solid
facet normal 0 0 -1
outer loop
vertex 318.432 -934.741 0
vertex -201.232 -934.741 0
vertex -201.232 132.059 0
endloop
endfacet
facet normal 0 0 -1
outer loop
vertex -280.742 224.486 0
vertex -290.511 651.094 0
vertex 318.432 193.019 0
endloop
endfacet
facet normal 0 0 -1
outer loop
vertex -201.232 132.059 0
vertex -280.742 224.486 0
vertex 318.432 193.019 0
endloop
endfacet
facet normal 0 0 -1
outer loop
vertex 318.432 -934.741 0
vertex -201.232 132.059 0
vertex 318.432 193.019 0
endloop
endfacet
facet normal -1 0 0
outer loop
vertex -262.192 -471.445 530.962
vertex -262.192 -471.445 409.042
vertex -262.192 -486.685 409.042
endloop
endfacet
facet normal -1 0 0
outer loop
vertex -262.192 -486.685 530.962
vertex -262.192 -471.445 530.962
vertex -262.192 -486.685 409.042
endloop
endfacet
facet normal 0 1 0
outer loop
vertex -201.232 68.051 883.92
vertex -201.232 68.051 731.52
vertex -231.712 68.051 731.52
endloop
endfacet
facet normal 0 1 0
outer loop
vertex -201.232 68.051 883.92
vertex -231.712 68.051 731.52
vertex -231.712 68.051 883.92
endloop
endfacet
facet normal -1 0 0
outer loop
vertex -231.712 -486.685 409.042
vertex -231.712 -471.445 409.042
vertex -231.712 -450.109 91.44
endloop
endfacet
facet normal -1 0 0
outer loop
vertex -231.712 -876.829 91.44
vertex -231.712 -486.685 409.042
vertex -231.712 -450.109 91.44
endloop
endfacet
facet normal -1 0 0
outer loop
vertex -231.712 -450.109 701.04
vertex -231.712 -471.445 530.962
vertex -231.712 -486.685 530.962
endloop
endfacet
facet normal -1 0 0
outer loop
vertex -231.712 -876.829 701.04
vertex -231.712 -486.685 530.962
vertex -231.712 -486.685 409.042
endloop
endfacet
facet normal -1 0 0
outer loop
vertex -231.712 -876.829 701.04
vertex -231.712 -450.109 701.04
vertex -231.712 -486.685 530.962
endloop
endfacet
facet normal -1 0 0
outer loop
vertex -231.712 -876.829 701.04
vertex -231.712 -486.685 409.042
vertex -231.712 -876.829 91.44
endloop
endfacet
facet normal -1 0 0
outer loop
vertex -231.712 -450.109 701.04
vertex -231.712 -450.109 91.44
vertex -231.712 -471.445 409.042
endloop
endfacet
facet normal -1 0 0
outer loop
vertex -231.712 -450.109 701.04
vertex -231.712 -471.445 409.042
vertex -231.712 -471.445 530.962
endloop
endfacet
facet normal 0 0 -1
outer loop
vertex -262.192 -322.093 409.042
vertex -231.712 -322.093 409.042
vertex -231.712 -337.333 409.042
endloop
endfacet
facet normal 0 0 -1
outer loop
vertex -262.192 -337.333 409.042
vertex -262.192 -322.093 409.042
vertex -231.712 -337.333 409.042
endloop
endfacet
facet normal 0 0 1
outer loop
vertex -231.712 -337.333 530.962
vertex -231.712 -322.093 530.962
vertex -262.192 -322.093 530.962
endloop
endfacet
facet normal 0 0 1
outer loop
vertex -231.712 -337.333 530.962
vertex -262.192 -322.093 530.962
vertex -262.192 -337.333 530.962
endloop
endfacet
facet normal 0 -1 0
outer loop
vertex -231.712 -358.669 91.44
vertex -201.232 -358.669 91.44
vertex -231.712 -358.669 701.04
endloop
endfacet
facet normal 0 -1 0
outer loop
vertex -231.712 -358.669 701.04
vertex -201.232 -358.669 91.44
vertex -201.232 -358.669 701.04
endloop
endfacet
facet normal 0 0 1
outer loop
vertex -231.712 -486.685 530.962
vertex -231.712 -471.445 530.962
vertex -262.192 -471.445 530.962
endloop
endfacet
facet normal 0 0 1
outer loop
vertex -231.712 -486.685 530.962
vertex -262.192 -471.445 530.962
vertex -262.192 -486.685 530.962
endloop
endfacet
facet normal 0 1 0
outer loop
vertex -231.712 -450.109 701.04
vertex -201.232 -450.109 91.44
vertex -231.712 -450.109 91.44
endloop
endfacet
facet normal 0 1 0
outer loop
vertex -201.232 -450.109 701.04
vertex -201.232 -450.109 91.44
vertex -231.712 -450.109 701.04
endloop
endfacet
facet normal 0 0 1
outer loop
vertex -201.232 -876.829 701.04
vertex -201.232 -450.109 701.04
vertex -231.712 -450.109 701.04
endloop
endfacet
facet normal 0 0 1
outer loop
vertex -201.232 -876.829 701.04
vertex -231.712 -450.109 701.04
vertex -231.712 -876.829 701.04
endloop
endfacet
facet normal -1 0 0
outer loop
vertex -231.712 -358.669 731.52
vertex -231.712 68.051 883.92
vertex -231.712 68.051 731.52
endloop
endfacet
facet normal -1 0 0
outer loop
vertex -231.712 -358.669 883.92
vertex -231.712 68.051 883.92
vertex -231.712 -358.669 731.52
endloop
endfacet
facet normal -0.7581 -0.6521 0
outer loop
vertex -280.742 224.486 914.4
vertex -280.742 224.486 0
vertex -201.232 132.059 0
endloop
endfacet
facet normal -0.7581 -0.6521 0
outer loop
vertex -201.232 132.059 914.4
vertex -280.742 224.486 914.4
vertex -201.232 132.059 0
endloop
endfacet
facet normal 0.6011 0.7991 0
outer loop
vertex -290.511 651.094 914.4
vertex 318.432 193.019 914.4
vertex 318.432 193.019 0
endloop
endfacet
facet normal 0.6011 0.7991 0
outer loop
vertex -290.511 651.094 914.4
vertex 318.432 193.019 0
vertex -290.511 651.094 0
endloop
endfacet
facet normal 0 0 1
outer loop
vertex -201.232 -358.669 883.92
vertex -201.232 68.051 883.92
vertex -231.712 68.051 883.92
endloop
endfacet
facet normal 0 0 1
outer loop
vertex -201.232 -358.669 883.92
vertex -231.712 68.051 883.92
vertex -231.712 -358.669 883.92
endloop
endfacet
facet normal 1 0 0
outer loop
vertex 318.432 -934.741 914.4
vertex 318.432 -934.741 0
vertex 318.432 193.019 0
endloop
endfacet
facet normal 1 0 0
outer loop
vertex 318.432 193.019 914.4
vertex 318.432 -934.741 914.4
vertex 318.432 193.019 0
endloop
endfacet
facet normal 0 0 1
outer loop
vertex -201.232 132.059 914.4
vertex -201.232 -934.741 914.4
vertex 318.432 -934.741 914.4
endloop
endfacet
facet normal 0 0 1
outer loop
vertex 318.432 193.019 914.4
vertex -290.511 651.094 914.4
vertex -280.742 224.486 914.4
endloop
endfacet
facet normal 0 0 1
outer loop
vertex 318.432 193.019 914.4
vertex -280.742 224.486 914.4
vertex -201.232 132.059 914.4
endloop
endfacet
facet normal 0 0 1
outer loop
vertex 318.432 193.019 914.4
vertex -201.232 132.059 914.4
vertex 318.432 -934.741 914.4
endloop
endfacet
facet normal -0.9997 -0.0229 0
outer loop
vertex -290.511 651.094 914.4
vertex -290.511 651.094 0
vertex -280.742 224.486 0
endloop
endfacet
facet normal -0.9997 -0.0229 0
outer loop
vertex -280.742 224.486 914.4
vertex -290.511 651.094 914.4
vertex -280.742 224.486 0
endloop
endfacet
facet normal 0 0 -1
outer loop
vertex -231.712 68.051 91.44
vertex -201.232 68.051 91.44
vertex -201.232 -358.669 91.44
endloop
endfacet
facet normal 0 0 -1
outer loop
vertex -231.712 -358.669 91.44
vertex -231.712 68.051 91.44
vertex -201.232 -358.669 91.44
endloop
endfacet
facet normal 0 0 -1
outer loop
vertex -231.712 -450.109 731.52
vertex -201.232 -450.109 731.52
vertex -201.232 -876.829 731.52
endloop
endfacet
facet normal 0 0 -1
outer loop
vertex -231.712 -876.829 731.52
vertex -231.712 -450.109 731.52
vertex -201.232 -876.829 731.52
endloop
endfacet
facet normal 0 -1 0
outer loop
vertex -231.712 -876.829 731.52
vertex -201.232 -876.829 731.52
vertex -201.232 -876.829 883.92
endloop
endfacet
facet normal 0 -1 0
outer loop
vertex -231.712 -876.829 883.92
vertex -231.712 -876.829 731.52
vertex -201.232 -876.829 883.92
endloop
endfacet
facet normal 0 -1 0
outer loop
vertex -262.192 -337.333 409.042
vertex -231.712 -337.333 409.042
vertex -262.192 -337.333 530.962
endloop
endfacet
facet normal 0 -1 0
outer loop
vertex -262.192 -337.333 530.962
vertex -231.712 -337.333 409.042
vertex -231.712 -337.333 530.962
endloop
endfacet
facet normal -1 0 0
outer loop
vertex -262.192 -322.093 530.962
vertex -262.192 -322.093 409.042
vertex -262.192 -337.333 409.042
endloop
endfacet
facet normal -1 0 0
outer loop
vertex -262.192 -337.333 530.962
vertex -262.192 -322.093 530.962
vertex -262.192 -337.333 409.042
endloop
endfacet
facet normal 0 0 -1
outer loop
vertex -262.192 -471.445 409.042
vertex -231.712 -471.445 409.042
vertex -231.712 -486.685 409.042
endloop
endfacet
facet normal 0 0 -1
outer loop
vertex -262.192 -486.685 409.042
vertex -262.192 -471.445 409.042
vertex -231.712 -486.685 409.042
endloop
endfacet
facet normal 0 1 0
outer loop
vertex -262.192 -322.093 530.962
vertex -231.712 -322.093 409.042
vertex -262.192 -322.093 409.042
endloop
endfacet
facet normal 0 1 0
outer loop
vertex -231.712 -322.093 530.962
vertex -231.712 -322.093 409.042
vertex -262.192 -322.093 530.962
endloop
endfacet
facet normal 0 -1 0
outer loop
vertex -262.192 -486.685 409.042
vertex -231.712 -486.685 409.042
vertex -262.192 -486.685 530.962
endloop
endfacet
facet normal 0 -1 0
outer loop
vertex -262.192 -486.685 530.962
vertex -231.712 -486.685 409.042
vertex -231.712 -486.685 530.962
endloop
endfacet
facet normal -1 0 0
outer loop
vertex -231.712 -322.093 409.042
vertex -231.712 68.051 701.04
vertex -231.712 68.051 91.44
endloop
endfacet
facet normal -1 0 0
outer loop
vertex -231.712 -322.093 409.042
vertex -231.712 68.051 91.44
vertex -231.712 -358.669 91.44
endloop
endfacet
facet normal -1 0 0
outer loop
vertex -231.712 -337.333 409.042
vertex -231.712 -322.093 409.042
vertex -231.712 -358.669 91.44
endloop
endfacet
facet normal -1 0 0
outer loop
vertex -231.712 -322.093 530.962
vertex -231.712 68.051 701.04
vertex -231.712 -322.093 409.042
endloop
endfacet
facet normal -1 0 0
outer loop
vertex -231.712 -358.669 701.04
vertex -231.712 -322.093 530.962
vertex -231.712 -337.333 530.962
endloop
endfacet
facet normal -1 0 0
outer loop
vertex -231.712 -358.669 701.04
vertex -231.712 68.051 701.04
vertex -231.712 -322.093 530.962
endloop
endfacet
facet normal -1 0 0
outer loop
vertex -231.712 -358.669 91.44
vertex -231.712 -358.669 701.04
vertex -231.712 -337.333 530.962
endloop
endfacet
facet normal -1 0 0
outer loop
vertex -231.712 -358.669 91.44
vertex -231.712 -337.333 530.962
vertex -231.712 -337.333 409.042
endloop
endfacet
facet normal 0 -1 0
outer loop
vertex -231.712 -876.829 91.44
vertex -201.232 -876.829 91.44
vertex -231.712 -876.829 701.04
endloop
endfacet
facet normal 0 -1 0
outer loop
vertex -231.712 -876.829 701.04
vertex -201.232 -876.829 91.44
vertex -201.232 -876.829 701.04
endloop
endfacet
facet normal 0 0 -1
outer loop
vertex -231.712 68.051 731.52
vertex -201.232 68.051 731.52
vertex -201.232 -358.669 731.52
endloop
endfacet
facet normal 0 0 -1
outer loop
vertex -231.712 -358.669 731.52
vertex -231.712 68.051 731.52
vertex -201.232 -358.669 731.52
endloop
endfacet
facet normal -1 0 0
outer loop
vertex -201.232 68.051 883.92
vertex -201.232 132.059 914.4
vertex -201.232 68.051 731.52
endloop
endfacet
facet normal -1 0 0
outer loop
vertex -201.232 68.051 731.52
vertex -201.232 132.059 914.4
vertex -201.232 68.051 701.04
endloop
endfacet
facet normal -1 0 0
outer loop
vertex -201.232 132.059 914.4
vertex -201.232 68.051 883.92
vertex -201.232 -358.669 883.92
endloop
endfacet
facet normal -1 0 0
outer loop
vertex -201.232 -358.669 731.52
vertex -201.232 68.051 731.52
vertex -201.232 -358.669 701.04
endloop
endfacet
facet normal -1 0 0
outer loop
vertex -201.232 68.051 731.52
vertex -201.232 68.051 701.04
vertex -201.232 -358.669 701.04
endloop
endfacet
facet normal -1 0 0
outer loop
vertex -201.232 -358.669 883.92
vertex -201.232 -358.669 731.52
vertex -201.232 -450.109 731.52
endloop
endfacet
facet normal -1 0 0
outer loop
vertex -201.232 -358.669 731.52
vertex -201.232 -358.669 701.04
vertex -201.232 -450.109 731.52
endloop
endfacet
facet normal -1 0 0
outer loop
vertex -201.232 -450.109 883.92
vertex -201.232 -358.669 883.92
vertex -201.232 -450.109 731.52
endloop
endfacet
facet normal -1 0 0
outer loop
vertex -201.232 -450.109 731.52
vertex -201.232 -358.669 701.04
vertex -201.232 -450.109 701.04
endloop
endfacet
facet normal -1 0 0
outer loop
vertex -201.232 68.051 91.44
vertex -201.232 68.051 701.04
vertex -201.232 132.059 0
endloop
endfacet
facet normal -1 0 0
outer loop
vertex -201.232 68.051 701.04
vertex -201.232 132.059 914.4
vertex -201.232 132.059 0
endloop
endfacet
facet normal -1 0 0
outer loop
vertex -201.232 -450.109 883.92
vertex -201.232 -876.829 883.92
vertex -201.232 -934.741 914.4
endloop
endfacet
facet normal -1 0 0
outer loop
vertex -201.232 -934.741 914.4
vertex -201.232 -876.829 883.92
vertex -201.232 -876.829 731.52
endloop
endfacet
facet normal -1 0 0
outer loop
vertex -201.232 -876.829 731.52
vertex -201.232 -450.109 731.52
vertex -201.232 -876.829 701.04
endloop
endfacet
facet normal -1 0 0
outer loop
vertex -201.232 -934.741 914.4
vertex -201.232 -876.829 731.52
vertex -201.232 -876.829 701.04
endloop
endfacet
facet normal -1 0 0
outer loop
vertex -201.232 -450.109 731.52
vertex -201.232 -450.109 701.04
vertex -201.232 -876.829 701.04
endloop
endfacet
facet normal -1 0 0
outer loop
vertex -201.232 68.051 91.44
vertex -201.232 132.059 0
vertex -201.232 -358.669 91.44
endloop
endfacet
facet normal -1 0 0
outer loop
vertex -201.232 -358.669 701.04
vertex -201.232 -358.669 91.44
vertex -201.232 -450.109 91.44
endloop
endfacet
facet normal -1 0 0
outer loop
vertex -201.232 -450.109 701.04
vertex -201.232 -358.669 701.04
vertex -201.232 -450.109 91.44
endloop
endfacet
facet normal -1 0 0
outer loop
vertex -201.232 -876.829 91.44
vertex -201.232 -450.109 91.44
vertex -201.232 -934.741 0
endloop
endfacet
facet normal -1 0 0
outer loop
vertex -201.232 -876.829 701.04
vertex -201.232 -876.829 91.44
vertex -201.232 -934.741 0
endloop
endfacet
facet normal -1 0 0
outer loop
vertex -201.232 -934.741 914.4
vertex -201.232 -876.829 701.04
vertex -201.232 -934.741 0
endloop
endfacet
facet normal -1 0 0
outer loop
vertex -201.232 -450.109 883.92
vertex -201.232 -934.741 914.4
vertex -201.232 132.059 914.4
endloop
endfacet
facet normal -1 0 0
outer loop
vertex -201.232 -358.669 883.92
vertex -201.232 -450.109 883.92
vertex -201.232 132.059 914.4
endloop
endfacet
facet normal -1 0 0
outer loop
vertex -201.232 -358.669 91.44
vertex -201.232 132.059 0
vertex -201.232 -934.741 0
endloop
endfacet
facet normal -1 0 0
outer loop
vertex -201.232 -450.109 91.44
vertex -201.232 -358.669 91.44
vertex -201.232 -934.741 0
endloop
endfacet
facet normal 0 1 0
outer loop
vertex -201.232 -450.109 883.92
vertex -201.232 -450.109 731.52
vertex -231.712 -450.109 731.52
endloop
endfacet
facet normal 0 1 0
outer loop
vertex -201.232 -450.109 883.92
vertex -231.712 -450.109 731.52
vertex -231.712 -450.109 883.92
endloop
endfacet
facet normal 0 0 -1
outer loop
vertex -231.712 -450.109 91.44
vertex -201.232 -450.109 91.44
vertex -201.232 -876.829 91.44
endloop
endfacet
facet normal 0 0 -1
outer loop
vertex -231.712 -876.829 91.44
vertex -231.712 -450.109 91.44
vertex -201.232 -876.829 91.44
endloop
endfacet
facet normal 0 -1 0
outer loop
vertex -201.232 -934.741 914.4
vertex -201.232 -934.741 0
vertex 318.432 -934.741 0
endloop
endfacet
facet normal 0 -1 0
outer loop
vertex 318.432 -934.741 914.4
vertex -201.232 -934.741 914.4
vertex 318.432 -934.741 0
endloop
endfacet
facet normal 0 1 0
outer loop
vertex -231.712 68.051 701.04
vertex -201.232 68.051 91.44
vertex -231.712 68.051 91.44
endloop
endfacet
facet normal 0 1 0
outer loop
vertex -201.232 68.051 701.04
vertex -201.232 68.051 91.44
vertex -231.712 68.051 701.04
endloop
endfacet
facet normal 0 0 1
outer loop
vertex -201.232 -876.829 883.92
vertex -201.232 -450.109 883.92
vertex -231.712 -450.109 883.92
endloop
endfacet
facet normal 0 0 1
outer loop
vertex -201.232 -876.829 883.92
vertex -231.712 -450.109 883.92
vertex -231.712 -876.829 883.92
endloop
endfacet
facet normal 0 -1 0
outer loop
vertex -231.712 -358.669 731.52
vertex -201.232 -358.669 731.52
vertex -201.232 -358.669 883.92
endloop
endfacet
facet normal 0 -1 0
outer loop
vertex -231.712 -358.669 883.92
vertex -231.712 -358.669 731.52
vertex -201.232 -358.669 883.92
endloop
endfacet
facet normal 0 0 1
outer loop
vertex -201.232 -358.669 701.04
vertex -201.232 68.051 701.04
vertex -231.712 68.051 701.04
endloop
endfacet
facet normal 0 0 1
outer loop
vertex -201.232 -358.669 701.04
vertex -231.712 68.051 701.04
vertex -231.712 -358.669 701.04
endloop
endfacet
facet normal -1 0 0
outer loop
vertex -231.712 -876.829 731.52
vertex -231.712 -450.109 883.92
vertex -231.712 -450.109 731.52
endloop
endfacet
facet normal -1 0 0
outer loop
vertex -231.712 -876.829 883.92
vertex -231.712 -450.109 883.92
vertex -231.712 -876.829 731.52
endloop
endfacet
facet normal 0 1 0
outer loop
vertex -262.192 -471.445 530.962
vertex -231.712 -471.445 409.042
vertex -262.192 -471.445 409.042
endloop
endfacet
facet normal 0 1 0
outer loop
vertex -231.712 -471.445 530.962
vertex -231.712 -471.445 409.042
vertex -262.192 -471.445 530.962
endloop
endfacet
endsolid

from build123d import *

# Parameters (mm, degrees)
F1_DEPTH = 914.4
F2_W     = 426.72
F2_H     = 609.6
F2_H_2   = 152.4
F3_DEPTH = 30.48
F4_W     = 15.24
F4_H     = 121.92
F5_DEPTH = 30.48


with BuildPart() as f1:
    # F0 (on Top) → F1 (new body)
    with BuildSketch(Plane.XY):
        Polygon((318.431516, 193.019261), (-290.511489, 651.093946), (-280.741865, 224.485797), (-201.23198, 132.059261), (-201.23198, -934.740739), (318.431516, -934.740739), align=None)
    extrude(amount=F1_DEPTH)

    # F2 (on face) → F3 (join)
    with BuildSketch(Plane(origin=(-201.23198, 0, 0), x_dir=(0, -1, 0), z_dir=(-1, 0, 0))):
        with Locations((145.308739, 396.24)):
            Rectangle(F2_W, F2_H)
        with Locations((663.468739, 396.24)):
            Rectangle(F2_W, F2_H)
        with Locations((145.308739, 807.72)):
            Rectangle(F2_W, F2_H_2)
        with Locations((663.468739, 807.72)):
            Rectangle(F2_W, F2_H_2)
    extrude(amount=F3_DEPTH)

    # F4 (on face) → F5 (join)
    with BuildSketch(Plane(origin=(-231.71198, 0, 0), x_dir=(0, -1, 0), z_dir=(-1, 0, 0))):
        with Locations((329.712739, 470.0016)):
            Rectangle(F4_W, F4_H)
        with Locations((479.064739, 470.0016)):
            Rectangle(F4_W, F4_H)
    extrude(amount=F5_DEPTH)


solid = f1.part
